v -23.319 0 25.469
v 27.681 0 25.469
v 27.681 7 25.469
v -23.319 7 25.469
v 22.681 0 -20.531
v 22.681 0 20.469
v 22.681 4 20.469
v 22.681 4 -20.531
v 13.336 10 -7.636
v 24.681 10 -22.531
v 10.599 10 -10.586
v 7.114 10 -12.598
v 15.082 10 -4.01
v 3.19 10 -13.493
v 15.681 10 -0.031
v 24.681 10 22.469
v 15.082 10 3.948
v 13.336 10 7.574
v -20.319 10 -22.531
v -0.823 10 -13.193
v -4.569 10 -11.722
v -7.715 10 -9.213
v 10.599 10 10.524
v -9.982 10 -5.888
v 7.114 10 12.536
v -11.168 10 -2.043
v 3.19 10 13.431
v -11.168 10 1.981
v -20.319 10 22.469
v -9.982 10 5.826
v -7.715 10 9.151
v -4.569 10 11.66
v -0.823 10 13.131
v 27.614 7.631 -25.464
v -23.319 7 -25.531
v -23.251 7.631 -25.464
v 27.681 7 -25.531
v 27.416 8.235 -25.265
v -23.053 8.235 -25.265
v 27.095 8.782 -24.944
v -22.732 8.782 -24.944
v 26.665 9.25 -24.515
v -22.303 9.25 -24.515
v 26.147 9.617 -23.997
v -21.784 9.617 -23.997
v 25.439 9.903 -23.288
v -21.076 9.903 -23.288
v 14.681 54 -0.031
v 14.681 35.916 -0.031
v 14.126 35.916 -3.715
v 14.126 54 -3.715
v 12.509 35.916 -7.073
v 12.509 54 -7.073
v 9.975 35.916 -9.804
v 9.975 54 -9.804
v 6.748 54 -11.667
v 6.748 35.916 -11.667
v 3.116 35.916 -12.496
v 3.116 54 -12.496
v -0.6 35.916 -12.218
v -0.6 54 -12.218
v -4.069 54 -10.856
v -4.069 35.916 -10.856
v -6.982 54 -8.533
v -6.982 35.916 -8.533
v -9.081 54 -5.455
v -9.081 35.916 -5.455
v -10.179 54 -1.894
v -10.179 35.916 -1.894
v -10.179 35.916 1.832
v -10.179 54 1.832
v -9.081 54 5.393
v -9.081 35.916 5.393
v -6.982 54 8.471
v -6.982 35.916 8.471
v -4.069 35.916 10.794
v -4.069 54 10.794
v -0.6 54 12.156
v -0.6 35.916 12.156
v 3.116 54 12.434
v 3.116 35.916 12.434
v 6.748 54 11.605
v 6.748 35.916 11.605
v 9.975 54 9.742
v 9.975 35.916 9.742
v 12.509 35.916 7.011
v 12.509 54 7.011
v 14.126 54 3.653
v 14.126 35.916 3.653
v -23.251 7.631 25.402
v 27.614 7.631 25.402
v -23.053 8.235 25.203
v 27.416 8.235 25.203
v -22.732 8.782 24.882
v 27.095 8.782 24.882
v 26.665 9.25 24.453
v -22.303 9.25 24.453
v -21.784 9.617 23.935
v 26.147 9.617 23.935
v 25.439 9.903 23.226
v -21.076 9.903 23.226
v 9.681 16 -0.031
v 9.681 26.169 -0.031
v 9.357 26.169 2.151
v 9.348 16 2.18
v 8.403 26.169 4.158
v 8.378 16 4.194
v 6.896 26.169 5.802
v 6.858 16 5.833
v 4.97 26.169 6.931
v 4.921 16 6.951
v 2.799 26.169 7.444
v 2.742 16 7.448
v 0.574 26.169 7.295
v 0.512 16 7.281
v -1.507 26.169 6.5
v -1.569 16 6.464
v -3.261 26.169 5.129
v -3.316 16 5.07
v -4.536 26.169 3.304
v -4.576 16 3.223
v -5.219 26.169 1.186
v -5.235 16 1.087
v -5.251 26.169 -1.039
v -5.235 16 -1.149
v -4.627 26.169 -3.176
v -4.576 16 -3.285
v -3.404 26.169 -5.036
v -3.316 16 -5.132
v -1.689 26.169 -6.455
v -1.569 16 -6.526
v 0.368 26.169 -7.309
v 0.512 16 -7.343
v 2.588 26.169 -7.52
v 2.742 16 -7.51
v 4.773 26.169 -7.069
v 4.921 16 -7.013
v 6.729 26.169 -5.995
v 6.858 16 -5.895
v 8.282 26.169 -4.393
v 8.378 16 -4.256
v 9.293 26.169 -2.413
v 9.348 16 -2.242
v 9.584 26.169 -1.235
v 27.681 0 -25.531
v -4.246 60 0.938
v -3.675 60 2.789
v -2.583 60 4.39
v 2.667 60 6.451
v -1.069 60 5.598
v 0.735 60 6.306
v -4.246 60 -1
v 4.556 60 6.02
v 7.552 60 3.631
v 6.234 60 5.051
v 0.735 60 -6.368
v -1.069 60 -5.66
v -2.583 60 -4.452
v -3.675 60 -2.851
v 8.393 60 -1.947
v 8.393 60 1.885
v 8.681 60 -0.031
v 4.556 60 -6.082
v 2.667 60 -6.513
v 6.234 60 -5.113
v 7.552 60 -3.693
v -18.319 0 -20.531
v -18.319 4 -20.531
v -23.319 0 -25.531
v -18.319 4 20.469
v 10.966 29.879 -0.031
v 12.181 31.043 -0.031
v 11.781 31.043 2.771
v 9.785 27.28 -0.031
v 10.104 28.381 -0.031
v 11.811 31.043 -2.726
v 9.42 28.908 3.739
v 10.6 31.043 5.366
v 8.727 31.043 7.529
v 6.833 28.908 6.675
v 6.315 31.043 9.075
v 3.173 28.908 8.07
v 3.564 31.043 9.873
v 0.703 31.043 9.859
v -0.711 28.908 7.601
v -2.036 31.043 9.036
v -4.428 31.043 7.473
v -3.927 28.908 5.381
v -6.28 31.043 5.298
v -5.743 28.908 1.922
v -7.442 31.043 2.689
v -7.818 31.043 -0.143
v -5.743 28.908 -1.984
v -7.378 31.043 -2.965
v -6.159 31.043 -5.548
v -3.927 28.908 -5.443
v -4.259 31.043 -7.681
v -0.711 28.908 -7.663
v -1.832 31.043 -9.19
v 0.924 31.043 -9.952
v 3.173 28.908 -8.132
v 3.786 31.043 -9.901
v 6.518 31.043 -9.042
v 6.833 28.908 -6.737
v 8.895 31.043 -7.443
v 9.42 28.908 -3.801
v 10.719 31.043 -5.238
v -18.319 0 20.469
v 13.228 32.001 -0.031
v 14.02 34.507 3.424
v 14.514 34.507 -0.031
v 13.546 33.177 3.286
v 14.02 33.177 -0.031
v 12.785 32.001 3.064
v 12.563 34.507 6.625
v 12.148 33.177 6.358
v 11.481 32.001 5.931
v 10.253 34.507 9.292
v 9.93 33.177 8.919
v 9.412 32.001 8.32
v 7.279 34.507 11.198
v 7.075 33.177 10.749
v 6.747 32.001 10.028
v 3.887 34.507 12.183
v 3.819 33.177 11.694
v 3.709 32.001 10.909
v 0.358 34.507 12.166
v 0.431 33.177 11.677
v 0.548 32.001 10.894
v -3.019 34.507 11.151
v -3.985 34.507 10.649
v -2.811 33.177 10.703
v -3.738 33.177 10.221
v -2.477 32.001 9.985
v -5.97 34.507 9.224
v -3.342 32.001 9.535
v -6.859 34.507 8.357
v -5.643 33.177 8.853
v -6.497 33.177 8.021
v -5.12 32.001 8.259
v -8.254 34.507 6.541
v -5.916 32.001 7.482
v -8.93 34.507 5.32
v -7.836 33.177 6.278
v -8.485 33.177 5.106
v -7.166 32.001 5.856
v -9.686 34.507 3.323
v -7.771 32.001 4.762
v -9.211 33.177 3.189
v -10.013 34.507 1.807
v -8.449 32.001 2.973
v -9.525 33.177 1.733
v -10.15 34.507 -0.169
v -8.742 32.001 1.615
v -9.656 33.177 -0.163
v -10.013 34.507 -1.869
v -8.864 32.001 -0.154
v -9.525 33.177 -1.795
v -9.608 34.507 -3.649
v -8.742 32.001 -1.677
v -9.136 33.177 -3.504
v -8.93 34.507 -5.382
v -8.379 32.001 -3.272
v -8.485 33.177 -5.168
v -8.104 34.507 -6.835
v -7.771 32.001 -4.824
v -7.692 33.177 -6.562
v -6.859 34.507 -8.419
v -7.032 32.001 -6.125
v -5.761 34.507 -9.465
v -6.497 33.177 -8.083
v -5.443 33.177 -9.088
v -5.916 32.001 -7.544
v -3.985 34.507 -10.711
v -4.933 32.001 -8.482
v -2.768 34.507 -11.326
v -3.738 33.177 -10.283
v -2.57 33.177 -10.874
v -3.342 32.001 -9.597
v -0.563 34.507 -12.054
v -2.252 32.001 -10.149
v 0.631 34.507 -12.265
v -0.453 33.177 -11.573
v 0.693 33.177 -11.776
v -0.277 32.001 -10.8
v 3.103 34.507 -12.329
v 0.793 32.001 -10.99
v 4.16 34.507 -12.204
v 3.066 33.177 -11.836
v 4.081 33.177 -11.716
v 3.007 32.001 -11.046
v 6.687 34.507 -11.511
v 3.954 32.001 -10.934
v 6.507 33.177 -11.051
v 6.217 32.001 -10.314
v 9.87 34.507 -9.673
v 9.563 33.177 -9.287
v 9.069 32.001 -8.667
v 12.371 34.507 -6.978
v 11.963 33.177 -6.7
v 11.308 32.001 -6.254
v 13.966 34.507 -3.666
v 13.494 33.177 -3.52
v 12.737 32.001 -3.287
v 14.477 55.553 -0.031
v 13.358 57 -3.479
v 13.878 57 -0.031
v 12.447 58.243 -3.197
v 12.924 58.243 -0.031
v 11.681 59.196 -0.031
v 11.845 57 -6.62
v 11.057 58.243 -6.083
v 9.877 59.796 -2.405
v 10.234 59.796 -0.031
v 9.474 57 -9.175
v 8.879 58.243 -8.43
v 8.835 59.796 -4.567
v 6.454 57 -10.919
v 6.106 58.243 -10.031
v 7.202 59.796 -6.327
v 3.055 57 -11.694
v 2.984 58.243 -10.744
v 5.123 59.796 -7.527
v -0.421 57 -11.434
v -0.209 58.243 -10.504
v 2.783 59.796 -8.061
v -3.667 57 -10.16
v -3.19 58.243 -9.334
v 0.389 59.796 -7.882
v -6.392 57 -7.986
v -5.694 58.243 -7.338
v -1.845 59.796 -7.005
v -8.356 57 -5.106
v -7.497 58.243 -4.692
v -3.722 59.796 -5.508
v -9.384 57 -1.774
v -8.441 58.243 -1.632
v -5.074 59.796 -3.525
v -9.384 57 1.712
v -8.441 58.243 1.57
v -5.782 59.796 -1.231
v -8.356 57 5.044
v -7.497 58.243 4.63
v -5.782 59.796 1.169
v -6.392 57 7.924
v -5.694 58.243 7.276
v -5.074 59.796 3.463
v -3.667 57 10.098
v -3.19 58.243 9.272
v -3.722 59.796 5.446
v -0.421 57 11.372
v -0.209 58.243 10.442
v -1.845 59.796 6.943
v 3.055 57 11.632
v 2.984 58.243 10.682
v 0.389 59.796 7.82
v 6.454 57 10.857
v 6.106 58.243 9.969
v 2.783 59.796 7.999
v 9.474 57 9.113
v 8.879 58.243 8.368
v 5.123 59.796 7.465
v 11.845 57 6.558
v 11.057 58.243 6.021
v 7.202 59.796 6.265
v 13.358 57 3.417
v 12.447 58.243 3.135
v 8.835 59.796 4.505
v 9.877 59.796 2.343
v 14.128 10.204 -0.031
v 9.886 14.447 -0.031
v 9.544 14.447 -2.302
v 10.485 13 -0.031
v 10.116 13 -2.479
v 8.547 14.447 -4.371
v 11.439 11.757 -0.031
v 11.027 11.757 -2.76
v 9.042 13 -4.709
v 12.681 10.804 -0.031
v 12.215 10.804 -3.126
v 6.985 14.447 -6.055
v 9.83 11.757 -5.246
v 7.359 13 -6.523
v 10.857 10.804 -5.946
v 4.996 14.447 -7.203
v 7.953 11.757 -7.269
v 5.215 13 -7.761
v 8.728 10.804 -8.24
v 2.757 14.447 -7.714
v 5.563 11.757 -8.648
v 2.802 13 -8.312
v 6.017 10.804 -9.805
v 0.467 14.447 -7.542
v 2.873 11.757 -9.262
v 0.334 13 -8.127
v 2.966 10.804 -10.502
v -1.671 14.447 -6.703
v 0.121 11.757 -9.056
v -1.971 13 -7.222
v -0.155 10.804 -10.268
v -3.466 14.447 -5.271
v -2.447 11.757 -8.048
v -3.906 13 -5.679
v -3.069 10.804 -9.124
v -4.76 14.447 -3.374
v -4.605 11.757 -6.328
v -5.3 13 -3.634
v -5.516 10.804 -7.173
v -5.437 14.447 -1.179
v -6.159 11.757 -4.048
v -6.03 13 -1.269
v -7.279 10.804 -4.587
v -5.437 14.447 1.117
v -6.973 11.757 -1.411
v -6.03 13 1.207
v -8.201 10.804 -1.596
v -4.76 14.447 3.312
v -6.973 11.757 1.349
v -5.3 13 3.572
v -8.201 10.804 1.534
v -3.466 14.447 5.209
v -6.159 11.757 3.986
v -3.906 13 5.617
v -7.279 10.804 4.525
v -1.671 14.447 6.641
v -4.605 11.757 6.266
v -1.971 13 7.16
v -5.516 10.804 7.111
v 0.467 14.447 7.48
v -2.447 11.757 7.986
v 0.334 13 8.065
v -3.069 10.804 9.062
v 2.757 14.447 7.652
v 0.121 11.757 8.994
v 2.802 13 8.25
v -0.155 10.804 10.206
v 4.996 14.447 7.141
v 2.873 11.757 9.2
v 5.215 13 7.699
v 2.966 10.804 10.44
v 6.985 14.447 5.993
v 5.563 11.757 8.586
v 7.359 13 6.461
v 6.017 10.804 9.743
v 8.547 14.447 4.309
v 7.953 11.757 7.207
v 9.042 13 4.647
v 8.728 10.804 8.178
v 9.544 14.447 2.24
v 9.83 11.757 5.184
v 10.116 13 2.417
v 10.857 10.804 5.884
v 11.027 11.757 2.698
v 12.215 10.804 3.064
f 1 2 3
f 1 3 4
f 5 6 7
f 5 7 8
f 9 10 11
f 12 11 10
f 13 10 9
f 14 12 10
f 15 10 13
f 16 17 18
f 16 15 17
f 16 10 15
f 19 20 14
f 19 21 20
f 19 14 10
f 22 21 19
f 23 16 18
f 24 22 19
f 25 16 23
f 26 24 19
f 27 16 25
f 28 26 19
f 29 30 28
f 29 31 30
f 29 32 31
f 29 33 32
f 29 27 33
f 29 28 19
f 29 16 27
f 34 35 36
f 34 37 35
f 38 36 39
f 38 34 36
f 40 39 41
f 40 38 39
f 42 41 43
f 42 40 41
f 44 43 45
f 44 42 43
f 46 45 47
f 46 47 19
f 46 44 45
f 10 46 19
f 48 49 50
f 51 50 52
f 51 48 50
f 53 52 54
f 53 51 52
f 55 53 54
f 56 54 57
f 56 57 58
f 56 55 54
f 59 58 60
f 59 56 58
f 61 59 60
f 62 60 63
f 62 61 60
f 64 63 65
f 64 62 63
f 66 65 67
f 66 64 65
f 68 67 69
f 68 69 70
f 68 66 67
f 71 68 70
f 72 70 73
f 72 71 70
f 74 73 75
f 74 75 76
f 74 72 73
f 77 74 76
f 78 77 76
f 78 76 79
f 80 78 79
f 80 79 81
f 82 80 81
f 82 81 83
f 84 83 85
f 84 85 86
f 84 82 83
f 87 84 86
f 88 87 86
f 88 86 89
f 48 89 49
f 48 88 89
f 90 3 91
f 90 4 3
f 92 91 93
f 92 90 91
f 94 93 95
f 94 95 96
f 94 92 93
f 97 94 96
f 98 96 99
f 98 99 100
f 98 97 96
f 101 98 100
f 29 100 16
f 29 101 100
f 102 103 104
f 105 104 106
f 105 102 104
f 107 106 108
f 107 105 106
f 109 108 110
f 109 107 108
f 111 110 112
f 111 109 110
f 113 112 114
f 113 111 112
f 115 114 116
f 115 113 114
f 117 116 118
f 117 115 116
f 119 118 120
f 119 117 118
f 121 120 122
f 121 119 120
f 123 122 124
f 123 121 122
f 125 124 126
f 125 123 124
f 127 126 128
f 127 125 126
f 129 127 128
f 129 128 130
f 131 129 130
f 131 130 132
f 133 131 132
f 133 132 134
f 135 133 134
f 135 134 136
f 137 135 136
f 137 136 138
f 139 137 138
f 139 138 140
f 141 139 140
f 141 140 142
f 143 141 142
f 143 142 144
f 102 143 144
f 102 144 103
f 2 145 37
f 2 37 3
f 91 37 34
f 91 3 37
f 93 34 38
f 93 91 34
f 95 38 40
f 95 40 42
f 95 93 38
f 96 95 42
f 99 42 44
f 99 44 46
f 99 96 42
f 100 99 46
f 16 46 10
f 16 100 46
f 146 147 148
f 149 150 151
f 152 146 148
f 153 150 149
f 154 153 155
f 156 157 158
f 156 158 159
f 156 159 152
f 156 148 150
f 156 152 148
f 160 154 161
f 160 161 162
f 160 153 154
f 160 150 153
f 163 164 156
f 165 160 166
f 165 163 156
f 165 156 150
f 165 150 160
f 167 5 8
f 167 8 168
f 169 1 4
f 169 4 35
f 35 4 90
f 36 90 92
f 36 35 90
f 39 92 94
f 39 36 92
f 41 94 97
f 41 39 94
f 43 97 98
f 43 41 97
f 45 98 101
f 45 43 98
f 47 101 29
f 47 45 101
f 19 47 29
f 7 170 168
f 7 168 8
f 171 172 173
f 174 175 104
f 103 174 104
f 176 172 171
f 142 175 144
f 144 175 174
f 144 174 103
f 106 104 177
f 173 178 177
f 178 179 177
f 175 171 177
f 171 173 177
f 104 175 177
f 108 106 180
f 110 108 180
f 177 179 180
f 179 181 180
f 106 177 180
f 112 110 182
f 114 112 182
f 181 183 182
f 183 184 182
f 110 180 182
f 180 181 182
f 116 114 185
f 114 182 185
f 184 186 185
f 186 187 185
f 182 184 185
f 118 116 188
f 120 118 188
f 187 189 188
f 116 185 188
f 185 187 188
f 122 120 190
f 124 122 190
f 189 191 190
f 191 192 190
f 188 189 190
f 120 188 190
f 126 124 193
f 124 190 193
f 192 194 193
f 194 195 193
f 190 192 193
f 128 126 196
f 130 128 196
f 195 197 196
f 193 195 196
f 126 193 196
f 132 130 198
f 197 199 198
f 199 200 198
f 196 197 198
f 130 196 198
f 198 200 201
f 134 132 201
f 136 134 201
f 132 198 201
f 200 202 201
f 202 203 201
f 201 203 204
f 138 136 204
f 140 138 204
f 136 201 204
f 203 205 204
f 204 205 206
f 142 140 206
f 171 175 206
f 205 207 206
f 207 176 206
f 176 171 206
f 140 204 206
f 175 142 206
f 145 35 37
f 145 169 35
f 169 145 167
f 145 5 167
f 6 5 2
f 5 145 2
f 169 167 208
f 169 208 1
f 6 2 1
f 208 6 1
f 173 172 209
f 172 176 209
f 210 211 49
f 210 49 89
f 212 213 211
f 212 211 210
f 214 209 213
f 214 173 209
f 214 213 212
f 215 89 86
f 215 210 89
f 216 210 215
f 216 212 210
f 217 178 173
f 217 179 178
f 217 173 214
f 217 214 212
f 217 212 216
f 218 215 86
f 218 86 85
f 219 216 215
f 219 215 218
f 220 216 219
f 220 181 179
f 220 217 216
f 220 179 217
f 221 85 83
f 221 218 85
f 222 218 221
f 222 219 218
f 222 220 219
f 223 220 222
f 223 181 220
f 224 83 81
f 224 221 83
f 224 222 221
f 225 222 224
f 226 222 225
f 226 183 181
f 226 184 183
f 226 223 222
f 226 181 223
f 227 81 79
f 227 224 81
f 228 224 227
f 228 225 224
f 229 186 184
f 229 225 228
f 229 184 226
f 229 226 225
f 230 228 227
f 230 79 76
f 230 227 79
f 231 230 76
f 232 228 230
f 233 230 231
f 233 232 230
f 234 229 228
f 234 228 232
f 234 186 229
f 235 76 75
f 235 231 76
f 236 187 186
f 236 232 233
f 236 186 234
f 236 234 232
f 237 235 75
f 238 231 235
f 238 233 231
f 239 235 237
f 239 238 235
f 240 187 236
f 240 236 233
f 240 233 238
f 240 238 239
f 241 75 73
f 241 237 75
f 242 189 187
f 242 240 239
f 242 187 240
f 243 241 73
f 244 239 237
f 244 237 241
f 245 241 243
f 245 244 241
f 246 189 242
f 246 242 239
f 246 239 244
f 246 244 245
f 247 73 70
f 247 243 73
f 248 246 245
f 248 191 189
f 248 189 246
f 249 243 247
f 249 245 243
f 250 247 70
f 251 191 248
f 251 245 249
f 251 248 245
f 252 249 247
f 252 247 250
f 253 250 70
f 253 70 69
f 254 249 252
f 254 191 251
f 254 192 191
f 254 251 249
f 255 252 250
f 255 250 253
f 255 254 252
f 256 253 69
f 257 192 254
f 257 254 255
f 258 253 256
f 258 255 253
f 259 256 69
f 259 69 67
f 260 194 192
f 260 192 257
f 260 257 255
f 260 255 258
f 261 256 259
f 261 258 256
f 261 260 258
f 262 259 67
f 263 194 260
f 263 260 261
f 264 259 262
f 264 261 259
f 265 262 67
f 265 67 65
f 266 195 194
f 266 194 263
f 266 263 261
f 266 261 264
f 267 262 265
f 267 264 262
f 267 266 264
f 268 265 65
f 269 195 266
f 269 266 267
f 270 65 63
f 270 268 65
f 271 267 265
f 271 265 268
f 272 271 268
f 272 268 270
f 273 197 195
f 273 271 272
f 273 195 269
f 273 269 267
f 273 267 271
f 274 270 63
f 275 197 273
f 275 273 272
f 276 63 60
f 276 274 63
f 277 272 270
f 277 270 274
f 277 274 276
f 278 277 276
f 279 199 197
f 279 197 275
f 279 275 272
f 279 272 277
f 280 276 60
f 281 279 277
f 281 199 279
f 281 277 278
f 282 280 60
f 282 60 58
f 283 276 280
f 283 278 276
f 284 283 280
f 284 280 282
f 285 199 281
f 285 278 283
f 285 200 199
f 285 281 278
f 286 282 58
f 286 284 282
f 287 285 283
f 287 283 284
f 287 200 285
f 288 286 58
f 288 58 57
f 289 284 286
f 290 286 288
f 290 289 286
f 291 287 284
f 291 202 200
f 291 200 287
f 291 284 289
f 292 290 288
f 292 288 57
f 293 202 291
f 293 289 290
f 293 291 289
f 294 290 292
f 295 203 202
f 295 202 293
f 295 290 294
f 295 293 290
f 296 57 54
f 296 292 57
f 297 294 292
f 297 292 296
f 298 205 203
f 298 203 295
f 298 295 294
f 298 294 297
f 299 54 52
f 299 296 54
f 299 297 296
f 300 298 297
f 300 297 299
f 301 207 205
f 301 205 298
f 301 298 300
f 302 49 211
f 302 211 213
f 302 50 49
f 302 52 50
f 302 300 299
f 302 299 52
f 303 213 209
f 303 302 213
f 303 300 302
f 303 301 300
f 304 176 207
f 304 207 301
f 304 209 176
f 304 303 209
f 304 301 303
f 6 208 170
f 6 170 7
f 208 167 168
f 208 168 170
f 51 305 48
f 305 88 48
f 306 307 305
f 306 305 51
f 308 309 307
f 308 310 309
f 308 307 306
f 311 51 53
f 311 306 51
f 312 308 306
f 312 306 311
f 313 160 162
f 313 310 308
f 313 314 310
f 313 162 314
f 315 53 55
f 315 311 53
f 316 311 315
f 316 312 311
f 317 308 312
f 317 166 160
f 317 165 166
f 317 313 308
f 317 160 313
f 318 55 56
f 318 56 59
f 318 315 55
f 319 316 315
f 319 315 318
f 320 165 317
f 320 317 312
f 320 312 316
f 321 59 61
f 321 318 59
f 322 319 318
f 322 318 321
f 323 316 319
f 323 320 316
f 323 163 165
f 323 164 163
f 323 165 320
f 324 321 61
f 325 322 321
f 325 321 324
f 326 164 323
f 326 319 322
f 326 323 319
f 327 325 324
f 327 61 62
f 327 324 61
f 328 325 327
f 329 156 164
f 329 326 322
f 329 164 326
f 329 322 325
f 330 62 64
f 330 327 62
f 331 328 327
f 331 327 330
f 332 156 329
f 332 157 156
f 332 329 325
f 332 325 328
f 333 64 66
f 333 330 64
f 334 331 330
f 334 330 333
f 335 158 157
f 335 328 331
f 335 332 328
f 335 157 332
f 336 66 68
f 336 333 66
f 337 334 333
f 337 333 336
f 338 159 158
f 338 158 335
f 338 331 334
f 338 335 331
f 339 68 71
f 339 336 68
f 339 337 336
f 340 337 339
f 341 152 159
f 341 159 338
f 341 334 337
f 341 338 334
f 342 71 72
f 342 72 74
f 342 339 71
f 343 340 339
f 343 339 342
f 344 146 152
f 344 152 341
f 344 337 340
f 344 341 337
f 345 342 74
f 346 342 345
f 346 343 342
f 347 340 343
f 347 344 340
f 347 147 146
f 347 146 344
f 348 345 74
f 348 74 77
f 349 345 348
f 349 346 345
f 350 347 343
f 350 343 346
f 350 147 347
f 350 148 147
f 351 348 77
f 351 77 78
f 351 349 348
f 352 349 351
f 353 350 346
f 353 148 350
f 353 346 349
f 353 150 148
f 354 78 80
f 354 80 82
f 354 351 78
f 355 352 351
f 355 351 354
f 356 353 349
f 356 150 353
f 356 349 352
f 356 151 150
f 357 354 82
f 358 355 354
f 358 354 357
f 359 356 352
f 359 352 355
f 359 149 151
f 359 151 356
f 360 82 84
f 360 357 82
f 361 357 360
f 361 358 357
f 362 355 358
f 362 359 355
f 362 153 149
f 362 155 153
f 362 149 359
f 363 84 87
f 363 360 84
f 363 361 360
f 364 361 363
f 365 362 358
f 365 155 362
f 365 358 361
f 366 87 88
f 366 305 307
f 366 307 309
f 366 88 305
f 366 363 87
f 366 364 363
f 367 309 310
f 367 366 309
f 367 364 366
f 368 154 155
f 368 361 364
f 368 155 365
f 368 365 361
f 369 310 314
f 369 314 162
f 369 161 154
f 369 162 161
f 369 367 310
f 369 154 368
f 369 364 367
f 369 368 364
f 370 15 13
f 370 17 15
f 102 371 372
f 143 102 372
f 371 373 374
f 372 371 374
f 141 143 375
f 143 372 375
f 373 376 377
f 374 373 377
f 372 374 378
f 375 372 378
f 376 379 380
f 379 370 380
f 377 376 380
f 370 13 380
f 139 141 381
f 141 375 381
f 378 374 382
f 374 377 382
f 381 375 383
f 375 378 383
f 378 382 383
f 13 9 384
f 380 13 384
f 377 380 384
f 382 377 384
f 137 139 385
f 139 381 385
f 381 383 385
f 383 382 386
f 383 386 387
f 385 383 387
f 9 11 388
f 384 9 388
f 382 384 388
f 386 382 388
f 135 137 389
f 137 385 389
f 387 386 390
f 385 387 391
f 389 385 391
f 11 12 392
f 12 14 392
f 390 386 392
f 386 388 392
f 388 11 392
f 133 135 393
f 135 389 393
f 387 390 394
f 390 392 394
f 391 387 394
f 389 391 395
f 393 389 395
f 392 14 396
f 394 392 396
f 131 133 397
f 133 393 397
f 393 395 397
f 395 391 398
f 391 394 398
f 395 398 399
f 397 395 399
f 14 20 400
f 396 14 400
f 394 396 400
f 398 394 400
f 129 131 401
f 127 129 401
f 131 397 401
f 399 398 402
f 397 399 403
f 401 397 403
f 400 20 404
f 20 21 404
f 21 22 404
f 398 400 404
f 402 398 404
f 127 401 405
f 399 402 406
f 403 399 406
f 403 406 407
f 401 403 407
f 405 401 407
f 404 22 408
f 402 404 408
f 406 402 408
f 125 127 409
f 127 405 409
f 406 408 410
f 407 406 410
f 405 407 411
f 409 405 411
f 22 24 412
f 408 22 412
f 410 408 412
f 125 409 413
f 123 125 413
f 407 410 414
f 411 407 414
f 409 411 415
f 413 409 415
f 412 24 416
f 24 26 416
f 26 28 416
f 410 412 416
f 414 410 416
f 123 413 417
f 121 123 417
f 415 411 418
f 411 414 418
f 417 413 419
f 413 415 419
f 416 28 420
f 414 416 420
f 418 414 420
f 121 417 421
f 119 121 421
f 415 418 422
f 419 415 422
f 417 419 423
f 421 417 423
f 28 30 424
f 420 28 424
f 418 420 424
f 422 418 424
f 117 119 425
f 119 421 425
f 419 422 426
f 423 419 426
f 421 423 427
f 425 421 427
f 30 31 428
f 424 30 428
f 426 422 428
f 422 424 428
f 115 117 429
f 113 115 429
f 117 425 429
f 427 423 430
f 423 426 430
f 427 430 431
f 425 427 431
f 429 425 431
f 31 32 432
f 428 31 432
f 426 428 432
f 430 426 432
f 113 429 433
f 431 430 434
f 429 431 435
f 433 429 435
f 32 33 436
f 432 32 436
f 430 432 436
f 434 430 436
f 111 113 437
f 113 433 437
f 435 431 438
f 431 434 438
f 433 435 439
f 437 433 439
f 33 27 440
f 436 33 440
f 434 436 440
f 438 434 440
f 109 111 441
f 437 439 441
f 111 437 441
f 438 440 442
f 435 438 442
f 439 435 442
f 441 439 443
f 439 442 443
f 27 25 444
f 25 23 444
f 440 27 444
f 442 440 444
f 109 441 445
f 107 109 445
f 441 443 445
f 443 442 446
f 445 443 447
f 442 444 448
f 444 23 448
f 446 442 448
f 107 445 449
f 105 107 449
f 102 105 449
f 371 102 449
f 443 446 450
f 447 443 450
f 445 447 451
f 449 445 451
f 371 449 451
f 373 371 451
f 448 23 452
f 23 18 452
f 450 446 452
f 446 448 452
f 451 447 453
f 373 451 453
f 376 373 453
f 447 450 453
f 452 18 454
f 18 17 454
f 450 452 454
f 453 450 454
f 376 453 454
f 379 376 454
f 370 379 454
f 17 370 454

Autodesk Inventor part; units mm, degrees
ref_plane "YZ Plane" through (0, 0, 0) normal (1, 0, 0) x (0, 1, 0)
ref_plane "XZ Plane" through (0, 0, 0) normal (0, 1, 0) x (-1, 0, 0)
ref_plane "XY Plane" through (0, 0, 0) normal (0, 0, 1) x (1, 0, 0)
sketch "Sketch2" plane through (0, 0, 0) normal (0, 1, 0) x (-1, 0, 0)
  line L0 (18.3186, 20.469) -> (-22.6814, 20.469)
  line L1 (-22.6814, 20.469) -> (-22.6814, -20.531)
  line L2 (-22.6814, -20.531) -> (18.3186, -20.531)
  line L3 (18.3186, -20.531) -> (18.3186, 20.469)
  line L4 (-27.6814, 25.469) -> (23.3186, 25.469)
  line L5 (23.3186, 25.469) -> (23.3186, -25.531)
  line L6 (23.3186, -25.531) -> (-27.6814, -25.531)
  line L7 (-27.6814, -25.531) -> (-27.6814, 25.469)
  line L8 (-22.6814, 20.469) -> (18.3186, 20.469)
  line L9 (18.3186, 20.469) -> (18.3186, -20.531)
  line L10 (18.3186, -20.531) -> (-22.6814, -20.531)
  line L11 (-22.6814, -20.531) -> (-22.6814, 20.469)
  line L12 (-22.6814, 20.469) -> (18.3186, 20.469)
  line L13 (18.3186, 20.469) -> (18.3186, -20.531)
  line L14 (18.3186, -20.531) -> (-22.6814, -20.531)
  line L15 (-22.6814, -20.531) -> (-22.6814, 20.469)
  point P0 (0, 0)
  dimension "d0" = 41
  dimension "d1" = 41
  dimension "d6" = 5
extrude "Extrusion1" add sketch "Sketch2" along normal blind 10 contours L3 L2 L1 L0 | L4 L5 L6 L7
sketch "Sketch5" plane through (0, 0, 0) normal (0, -1, 0) x (1, 0, 0)
  line L0 (27.6814, 25.469) -> (-23.3186, 25.469)
  line L1 (-23.3186, 25.469) -> (-23.3186, -25.531)
  line L2 (-23.3186, -25.531) -> (27.6814, -25.531)
  line L3 (27.6814, -25.531) -> (27.6814, 25.469)
  line L4 (-18.3186, 20.469) -> (22.6814, 20.469)
  line L5 (22.6814, 20.469) -> (22.6814, -20.531)
  line L6 (22.6814, -20.531) -> (-18.3186, -20.531)
  line L7 (-18.3186, -20.531) -> (-18.3186, 20.469)
  point P0 (0, 0)
  dimension "d10" = 5
extrude "Extrusion2" cut sketch "Sketch5" against normal blind 4 contours L4 L5 L6 L7
fillet "Fillet1" radius 3 4 edges at (-23.3186, 10, -0.031) (2.1814, 10, 25.469) (27.6814, 10, -0.031) (2.1814, 10, -25.531)
sketch "Sketch6" plane through (0, 10, 0) normal (0, 1, 0) x (1, 0, 0)
  circle A0 centre (2.1814, 0.031) radius 7.5
  line L0 (-23.3186, 25.531) -> (27.6814, 25.531) projected
  line L1 (27.6814, -25.469) -> (-23.3186, -25.469) projected
  point P0 (0, 0)
  dimension "d14" = 15
extrude "Extrusion3" add sketch "Sketch6" along normal blind 50
sketch "Sketch7" plane through (2.1814, 60, -0.031) normal (0, 1, 0) x (1, 0, 0)
  circle A0 centre (0, 0) radius 12.5
  point P0 (-2.1814, -0.031)
  dimension "d17" = 25
extrude "Extrusion4" add sketch "Sketch7" against normal blind 30
fillet "Fillet2" radius 6 1 edges at (-10.3186, 60, -0.031)
fillet "Fillet3" radius 6 1 edges at (-10.3186, 30, -0.031)
fillet "Fillet4" radius 6 1 edges at (-5.3186, 30, -0.031)
fillet "Fillet5" radius 6 1 edges at (-5.3186, 10, -0.031)
properties part number "SMI Stamp Holder"
